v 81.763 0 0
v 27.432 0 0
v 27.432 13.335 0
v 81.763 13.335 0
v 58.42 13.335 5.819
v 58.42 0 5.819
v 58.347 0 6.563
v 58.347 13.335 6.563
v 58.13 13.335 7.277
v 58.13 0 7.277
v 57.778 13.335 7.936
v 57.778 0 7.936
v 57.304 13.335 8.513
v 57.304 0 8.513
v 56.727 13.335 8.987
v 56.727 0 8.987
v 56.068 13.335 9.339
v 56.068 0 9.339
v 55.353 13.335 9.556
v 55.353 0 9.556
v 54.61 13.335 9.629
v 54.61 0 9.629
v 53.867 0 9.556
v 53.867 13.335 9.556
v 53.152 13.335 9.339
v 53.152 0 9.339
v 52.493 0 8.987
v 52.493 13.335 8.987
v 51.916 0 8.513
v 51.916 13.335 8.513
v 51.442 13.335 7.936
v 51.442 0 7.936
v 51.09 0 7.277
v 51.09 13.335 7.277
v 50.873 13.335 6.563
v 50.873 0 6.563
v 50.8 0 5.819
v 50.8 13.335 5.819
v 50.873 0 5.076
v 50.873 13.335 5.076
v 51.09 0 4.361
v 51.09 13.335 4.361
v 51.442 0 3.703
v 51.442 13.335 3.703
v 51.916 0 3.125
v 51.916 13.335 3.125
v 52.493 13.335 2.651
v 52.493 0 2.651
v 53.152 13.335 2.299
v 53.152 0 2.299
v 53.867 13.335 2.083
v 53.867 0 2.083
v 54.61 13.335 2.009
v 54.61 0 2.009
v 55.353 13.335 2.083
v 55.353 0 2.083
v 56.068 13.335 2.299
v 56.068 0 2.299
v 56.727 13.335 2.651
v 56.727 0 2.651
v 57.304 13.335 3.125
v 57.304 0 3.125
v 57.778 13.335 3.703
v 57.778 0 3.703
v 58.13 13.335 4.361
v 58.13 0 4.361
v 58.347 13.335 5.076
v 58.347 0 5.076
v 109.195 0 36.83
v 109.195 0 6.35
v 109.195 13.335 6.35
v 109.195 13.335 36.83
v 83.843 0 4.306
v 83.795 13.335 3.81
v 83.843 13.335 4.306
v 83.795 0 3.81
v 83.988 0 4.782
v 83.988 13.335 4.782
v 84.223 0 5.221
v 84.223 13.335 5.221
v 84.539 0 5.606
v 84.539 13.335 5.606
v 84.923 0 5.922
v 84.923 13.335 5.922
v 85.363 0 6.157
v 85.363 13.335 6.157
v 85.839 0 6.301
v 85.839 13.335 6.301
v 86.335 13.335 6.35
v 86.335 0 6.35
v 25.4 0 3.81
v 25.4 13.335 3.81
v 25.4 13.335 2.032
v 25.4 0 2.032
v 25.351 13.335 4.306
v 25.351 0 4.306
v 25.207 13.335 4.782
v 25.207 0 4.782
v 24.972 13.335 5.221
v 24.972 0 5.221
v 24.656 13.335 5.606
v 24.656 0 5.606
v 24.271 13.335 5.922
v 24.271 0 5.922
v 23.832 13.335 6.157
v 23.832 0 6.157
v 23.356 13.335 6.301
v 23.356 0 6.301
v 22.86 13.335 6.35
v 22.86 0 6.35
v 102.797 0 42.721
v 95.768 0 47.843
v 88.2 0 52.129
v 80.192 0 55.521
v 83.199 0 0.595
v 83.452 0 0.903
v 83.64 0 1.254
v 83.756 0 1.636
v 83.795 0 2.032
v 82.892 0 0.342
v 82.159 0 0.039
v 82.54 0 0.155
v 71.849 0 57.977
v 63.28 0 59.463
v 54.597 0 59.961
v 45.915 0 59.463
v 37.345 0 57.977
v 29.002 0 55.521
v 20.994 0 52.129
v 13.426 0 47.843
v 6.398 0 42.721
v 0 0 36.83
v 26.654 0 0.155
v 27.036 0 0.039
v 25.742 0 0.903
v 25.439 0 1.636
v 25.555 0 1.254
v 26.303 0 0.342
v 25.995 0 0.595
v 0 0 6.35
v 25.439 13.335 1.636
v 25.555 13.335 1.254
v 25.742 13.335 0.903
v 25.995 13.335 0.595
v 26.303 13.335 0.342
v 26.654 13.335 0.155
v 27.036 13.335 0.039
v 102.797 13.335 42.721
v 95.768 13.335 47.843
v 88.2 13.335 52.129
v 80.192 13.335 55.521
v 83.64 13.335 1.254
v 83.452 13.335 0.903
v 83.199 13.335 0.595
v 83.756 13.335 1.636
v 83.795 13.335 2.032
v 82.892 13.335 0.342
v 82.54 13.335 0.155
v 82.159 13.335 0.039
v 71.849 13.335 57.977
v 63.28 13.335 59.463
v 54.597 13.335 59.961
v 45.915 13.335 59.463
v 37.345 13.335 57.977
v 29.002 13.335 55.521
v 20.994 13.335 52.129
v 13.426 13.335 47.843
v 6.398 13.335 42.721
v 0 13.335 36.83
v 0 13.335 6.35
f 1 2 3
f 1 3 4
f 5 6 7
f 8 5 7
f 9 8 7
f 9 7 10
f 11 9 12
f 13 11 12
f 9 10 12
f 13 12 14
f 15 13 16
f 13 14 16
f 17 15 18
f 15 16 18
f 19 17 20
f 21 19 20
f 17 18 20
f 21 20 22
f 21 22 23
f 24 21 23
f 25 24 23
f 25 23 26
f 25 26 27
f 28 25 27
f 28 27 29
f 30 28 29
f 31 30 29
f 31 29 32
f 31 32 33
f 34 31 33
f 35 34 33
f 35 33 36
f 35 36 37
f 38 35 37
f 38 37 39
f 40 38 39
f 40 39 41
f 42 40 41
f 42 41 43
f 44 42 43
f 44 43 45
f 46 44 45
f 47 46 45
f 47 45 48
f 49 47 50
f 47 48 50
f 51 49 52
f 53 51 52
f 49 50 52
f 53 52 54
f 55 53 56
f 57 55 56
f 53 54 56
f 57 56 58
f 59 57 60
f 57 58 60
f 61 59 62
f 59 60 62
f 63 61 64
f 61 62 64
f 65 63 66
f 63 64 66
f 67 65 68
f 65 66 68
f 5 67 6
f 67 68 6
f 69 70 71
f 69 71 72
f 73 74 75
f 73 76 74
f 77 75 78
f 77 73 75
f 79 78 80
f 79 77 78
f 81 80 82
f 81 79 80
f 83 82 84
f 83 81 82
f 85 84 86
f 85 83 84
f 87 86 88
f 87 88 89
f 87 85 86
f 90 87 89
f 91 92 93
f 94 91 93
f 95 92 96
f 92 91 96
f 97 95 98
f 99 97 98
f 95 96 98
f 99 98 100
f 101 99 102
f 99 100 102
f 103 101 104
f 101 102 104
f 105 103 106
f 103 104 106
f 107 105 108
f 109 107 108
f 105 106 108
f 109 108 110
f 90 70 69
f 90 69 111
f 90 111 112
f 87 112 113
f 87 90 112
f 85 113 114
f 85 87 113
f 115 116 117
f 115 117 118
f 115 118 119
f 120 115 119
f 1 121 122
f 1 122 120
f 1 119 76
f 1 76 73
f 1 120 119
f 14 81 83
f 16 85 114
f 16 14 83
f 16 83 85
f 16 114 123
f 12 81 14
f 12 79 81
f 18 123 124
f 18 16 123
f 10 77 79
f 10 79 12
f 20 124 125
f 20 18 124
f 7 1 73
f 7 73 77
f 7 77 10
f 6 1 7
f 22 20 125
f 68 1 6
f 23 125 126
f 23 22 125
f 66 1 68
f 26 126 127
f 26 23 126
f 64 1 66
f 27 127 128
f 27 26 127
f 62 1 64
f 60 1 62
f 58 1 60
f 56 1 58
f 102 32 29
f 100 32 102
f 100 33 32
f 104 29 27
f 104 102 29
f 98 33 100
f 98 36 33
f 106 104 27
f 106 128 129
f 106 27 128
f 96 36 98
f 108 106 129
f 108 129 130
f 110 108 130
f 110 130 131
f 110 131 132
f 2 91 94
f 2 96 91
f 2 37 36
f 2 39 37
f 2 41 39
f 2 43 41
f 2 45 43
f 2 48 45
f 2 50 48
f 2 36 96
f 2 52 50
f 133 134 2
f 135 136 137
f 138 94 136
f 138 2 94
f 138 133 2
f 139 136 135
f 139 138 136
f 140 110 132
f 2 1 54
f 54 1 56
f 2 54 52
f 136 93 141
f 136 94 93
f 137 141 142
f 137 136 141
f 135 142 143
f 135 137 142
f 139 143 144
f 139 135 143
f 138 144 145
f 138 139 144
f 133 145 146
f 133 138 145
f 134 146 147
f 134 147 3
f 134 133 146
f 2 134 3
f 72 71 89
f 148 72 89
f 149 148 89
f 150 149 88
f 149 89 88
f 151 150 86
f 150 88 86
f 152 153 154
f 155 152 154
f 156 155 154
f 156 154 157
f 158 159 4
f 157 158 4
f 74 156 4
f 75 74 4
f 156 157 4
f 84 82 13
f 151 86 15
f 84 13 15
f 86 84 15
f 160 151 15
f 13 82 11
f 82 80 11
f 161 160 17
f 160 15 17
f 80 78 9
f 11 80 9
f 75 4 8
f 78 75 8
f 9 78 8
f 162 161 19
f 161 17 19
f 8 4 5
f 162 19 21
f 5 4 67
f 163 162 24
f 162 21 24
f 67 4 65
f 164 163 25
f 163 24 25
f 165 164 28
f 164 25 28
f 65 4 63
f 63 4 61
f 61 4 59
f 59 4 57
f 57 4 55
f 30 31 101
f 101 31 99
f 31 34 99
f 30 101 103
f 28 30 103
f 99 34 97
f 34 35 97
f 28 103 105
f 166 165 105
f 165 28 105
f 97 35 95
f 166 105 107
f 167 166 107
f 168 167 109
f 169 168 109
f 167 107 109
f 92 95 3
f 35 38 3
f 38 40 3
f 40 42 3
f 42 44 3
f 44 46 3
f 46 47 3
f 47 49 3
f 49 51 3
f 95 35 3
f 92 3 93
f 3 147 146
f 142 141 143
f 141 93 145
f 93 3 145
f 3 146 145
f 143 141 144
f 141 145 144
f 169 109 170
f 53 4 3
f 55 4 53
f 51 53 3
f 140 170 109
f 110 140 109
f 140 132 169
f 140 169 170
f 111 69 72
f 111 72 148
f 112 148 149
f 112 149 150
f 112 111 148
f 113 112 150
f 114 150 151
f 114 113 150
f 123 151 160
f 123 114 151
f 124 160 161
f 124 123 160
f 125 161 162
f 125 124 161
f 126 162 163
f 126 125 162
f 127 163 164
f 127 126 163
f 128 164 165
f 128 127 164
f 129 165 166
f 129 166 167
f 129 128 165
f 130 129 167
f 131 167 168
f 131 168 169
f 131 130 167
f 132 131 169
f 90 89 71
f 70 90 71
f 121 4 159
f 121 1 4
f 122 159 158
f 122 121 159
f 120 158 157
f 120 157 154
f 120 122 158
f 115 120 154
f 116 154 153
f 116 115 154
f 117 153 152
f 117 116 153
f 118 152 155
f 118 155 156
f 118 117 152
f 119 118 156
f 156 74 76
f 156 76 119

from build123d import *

# Parameters (mm, degrees)
BOSS_EXTRUDE2_DEPTH = 13.335
SKETCH10_W          = 25.4
SKETCH10_H          = 6.35
CUT_EXTRUDE1_DEPTH  = 14.335
FILLET1_R           = 2.54
FILLET2_R           = 2.032
SKETCH11_R          = 3.81
CUT_EXTRUDE2_DEPTH  = 14.335


with BuildPart() as part:
    # Sketch6 → Boss-Extrude2 (new body)
    with BuildSketch(Plane(origin=(0, 0, 0), x_dir=(1, 0, 0), z_dir=(0, 1, 0))):
        with BuildLine():
            Line((0, 0), (109.1946, 0))
            Line((109.1946, 0), (109.1946, -36.83))
            ThreePointArc((109.1946, -36.83), (54.5973, -59.960965275), (0, -36.83))
            Line((0, -36.83), (0, 0))
        make_face()
    extrude(amount=BOSS_EXTRUDE2_DEPTH)

    # Sketch10 → Cut-Extrude1 (cut, through all)
    with BuildSketch(Plane(origin=(0, 13.335, 0), x_dir=(1, 0, 0), z_dir=(0, 1, 0))):
        with Locations((96.4946, -3.175)):
            Rectangle(SKETCH10_W, SKETCH10_H)
        with Locations((12.7, -3.175)):
            Rectangle(SKETCH10_W, SKETCH10_H)
    extrude(amount=-CUT_EXTRUDE1_DEPTH, mode=Mode.SUBTRACT)

    # Fillet1
    fillet1_edges = [part.edges().sort_by_distance(p)[0] for p in [
        (25.4, 6.6675, 6.35),
        (83.7946, 6.6675, 6.35),
    ]]
    fillet(fillet1_edges, radius=FILLET1_R)

    # Fillet2
    fillet2_edges = [part.edges().sort_by_distance(p)[0] for p in [
        (25.4, 6.6675, 0),
        (83.7946, 6.6675, 0),
    ]]
    fillet(fillet2_edges, radius=FILLET2_R)

    # Sketch11 → Cut-Extrude2 (cut, through all)
    with BuildSketch(Plane.XZ):
        with Locations((54.61, 5.819375203)):
            Circle(SKETCH11_R)
    extrude(amount=-CUT_EXTRUDE2_DEPTH, mode=Mode.SUBTRACT)


solid = part.part
